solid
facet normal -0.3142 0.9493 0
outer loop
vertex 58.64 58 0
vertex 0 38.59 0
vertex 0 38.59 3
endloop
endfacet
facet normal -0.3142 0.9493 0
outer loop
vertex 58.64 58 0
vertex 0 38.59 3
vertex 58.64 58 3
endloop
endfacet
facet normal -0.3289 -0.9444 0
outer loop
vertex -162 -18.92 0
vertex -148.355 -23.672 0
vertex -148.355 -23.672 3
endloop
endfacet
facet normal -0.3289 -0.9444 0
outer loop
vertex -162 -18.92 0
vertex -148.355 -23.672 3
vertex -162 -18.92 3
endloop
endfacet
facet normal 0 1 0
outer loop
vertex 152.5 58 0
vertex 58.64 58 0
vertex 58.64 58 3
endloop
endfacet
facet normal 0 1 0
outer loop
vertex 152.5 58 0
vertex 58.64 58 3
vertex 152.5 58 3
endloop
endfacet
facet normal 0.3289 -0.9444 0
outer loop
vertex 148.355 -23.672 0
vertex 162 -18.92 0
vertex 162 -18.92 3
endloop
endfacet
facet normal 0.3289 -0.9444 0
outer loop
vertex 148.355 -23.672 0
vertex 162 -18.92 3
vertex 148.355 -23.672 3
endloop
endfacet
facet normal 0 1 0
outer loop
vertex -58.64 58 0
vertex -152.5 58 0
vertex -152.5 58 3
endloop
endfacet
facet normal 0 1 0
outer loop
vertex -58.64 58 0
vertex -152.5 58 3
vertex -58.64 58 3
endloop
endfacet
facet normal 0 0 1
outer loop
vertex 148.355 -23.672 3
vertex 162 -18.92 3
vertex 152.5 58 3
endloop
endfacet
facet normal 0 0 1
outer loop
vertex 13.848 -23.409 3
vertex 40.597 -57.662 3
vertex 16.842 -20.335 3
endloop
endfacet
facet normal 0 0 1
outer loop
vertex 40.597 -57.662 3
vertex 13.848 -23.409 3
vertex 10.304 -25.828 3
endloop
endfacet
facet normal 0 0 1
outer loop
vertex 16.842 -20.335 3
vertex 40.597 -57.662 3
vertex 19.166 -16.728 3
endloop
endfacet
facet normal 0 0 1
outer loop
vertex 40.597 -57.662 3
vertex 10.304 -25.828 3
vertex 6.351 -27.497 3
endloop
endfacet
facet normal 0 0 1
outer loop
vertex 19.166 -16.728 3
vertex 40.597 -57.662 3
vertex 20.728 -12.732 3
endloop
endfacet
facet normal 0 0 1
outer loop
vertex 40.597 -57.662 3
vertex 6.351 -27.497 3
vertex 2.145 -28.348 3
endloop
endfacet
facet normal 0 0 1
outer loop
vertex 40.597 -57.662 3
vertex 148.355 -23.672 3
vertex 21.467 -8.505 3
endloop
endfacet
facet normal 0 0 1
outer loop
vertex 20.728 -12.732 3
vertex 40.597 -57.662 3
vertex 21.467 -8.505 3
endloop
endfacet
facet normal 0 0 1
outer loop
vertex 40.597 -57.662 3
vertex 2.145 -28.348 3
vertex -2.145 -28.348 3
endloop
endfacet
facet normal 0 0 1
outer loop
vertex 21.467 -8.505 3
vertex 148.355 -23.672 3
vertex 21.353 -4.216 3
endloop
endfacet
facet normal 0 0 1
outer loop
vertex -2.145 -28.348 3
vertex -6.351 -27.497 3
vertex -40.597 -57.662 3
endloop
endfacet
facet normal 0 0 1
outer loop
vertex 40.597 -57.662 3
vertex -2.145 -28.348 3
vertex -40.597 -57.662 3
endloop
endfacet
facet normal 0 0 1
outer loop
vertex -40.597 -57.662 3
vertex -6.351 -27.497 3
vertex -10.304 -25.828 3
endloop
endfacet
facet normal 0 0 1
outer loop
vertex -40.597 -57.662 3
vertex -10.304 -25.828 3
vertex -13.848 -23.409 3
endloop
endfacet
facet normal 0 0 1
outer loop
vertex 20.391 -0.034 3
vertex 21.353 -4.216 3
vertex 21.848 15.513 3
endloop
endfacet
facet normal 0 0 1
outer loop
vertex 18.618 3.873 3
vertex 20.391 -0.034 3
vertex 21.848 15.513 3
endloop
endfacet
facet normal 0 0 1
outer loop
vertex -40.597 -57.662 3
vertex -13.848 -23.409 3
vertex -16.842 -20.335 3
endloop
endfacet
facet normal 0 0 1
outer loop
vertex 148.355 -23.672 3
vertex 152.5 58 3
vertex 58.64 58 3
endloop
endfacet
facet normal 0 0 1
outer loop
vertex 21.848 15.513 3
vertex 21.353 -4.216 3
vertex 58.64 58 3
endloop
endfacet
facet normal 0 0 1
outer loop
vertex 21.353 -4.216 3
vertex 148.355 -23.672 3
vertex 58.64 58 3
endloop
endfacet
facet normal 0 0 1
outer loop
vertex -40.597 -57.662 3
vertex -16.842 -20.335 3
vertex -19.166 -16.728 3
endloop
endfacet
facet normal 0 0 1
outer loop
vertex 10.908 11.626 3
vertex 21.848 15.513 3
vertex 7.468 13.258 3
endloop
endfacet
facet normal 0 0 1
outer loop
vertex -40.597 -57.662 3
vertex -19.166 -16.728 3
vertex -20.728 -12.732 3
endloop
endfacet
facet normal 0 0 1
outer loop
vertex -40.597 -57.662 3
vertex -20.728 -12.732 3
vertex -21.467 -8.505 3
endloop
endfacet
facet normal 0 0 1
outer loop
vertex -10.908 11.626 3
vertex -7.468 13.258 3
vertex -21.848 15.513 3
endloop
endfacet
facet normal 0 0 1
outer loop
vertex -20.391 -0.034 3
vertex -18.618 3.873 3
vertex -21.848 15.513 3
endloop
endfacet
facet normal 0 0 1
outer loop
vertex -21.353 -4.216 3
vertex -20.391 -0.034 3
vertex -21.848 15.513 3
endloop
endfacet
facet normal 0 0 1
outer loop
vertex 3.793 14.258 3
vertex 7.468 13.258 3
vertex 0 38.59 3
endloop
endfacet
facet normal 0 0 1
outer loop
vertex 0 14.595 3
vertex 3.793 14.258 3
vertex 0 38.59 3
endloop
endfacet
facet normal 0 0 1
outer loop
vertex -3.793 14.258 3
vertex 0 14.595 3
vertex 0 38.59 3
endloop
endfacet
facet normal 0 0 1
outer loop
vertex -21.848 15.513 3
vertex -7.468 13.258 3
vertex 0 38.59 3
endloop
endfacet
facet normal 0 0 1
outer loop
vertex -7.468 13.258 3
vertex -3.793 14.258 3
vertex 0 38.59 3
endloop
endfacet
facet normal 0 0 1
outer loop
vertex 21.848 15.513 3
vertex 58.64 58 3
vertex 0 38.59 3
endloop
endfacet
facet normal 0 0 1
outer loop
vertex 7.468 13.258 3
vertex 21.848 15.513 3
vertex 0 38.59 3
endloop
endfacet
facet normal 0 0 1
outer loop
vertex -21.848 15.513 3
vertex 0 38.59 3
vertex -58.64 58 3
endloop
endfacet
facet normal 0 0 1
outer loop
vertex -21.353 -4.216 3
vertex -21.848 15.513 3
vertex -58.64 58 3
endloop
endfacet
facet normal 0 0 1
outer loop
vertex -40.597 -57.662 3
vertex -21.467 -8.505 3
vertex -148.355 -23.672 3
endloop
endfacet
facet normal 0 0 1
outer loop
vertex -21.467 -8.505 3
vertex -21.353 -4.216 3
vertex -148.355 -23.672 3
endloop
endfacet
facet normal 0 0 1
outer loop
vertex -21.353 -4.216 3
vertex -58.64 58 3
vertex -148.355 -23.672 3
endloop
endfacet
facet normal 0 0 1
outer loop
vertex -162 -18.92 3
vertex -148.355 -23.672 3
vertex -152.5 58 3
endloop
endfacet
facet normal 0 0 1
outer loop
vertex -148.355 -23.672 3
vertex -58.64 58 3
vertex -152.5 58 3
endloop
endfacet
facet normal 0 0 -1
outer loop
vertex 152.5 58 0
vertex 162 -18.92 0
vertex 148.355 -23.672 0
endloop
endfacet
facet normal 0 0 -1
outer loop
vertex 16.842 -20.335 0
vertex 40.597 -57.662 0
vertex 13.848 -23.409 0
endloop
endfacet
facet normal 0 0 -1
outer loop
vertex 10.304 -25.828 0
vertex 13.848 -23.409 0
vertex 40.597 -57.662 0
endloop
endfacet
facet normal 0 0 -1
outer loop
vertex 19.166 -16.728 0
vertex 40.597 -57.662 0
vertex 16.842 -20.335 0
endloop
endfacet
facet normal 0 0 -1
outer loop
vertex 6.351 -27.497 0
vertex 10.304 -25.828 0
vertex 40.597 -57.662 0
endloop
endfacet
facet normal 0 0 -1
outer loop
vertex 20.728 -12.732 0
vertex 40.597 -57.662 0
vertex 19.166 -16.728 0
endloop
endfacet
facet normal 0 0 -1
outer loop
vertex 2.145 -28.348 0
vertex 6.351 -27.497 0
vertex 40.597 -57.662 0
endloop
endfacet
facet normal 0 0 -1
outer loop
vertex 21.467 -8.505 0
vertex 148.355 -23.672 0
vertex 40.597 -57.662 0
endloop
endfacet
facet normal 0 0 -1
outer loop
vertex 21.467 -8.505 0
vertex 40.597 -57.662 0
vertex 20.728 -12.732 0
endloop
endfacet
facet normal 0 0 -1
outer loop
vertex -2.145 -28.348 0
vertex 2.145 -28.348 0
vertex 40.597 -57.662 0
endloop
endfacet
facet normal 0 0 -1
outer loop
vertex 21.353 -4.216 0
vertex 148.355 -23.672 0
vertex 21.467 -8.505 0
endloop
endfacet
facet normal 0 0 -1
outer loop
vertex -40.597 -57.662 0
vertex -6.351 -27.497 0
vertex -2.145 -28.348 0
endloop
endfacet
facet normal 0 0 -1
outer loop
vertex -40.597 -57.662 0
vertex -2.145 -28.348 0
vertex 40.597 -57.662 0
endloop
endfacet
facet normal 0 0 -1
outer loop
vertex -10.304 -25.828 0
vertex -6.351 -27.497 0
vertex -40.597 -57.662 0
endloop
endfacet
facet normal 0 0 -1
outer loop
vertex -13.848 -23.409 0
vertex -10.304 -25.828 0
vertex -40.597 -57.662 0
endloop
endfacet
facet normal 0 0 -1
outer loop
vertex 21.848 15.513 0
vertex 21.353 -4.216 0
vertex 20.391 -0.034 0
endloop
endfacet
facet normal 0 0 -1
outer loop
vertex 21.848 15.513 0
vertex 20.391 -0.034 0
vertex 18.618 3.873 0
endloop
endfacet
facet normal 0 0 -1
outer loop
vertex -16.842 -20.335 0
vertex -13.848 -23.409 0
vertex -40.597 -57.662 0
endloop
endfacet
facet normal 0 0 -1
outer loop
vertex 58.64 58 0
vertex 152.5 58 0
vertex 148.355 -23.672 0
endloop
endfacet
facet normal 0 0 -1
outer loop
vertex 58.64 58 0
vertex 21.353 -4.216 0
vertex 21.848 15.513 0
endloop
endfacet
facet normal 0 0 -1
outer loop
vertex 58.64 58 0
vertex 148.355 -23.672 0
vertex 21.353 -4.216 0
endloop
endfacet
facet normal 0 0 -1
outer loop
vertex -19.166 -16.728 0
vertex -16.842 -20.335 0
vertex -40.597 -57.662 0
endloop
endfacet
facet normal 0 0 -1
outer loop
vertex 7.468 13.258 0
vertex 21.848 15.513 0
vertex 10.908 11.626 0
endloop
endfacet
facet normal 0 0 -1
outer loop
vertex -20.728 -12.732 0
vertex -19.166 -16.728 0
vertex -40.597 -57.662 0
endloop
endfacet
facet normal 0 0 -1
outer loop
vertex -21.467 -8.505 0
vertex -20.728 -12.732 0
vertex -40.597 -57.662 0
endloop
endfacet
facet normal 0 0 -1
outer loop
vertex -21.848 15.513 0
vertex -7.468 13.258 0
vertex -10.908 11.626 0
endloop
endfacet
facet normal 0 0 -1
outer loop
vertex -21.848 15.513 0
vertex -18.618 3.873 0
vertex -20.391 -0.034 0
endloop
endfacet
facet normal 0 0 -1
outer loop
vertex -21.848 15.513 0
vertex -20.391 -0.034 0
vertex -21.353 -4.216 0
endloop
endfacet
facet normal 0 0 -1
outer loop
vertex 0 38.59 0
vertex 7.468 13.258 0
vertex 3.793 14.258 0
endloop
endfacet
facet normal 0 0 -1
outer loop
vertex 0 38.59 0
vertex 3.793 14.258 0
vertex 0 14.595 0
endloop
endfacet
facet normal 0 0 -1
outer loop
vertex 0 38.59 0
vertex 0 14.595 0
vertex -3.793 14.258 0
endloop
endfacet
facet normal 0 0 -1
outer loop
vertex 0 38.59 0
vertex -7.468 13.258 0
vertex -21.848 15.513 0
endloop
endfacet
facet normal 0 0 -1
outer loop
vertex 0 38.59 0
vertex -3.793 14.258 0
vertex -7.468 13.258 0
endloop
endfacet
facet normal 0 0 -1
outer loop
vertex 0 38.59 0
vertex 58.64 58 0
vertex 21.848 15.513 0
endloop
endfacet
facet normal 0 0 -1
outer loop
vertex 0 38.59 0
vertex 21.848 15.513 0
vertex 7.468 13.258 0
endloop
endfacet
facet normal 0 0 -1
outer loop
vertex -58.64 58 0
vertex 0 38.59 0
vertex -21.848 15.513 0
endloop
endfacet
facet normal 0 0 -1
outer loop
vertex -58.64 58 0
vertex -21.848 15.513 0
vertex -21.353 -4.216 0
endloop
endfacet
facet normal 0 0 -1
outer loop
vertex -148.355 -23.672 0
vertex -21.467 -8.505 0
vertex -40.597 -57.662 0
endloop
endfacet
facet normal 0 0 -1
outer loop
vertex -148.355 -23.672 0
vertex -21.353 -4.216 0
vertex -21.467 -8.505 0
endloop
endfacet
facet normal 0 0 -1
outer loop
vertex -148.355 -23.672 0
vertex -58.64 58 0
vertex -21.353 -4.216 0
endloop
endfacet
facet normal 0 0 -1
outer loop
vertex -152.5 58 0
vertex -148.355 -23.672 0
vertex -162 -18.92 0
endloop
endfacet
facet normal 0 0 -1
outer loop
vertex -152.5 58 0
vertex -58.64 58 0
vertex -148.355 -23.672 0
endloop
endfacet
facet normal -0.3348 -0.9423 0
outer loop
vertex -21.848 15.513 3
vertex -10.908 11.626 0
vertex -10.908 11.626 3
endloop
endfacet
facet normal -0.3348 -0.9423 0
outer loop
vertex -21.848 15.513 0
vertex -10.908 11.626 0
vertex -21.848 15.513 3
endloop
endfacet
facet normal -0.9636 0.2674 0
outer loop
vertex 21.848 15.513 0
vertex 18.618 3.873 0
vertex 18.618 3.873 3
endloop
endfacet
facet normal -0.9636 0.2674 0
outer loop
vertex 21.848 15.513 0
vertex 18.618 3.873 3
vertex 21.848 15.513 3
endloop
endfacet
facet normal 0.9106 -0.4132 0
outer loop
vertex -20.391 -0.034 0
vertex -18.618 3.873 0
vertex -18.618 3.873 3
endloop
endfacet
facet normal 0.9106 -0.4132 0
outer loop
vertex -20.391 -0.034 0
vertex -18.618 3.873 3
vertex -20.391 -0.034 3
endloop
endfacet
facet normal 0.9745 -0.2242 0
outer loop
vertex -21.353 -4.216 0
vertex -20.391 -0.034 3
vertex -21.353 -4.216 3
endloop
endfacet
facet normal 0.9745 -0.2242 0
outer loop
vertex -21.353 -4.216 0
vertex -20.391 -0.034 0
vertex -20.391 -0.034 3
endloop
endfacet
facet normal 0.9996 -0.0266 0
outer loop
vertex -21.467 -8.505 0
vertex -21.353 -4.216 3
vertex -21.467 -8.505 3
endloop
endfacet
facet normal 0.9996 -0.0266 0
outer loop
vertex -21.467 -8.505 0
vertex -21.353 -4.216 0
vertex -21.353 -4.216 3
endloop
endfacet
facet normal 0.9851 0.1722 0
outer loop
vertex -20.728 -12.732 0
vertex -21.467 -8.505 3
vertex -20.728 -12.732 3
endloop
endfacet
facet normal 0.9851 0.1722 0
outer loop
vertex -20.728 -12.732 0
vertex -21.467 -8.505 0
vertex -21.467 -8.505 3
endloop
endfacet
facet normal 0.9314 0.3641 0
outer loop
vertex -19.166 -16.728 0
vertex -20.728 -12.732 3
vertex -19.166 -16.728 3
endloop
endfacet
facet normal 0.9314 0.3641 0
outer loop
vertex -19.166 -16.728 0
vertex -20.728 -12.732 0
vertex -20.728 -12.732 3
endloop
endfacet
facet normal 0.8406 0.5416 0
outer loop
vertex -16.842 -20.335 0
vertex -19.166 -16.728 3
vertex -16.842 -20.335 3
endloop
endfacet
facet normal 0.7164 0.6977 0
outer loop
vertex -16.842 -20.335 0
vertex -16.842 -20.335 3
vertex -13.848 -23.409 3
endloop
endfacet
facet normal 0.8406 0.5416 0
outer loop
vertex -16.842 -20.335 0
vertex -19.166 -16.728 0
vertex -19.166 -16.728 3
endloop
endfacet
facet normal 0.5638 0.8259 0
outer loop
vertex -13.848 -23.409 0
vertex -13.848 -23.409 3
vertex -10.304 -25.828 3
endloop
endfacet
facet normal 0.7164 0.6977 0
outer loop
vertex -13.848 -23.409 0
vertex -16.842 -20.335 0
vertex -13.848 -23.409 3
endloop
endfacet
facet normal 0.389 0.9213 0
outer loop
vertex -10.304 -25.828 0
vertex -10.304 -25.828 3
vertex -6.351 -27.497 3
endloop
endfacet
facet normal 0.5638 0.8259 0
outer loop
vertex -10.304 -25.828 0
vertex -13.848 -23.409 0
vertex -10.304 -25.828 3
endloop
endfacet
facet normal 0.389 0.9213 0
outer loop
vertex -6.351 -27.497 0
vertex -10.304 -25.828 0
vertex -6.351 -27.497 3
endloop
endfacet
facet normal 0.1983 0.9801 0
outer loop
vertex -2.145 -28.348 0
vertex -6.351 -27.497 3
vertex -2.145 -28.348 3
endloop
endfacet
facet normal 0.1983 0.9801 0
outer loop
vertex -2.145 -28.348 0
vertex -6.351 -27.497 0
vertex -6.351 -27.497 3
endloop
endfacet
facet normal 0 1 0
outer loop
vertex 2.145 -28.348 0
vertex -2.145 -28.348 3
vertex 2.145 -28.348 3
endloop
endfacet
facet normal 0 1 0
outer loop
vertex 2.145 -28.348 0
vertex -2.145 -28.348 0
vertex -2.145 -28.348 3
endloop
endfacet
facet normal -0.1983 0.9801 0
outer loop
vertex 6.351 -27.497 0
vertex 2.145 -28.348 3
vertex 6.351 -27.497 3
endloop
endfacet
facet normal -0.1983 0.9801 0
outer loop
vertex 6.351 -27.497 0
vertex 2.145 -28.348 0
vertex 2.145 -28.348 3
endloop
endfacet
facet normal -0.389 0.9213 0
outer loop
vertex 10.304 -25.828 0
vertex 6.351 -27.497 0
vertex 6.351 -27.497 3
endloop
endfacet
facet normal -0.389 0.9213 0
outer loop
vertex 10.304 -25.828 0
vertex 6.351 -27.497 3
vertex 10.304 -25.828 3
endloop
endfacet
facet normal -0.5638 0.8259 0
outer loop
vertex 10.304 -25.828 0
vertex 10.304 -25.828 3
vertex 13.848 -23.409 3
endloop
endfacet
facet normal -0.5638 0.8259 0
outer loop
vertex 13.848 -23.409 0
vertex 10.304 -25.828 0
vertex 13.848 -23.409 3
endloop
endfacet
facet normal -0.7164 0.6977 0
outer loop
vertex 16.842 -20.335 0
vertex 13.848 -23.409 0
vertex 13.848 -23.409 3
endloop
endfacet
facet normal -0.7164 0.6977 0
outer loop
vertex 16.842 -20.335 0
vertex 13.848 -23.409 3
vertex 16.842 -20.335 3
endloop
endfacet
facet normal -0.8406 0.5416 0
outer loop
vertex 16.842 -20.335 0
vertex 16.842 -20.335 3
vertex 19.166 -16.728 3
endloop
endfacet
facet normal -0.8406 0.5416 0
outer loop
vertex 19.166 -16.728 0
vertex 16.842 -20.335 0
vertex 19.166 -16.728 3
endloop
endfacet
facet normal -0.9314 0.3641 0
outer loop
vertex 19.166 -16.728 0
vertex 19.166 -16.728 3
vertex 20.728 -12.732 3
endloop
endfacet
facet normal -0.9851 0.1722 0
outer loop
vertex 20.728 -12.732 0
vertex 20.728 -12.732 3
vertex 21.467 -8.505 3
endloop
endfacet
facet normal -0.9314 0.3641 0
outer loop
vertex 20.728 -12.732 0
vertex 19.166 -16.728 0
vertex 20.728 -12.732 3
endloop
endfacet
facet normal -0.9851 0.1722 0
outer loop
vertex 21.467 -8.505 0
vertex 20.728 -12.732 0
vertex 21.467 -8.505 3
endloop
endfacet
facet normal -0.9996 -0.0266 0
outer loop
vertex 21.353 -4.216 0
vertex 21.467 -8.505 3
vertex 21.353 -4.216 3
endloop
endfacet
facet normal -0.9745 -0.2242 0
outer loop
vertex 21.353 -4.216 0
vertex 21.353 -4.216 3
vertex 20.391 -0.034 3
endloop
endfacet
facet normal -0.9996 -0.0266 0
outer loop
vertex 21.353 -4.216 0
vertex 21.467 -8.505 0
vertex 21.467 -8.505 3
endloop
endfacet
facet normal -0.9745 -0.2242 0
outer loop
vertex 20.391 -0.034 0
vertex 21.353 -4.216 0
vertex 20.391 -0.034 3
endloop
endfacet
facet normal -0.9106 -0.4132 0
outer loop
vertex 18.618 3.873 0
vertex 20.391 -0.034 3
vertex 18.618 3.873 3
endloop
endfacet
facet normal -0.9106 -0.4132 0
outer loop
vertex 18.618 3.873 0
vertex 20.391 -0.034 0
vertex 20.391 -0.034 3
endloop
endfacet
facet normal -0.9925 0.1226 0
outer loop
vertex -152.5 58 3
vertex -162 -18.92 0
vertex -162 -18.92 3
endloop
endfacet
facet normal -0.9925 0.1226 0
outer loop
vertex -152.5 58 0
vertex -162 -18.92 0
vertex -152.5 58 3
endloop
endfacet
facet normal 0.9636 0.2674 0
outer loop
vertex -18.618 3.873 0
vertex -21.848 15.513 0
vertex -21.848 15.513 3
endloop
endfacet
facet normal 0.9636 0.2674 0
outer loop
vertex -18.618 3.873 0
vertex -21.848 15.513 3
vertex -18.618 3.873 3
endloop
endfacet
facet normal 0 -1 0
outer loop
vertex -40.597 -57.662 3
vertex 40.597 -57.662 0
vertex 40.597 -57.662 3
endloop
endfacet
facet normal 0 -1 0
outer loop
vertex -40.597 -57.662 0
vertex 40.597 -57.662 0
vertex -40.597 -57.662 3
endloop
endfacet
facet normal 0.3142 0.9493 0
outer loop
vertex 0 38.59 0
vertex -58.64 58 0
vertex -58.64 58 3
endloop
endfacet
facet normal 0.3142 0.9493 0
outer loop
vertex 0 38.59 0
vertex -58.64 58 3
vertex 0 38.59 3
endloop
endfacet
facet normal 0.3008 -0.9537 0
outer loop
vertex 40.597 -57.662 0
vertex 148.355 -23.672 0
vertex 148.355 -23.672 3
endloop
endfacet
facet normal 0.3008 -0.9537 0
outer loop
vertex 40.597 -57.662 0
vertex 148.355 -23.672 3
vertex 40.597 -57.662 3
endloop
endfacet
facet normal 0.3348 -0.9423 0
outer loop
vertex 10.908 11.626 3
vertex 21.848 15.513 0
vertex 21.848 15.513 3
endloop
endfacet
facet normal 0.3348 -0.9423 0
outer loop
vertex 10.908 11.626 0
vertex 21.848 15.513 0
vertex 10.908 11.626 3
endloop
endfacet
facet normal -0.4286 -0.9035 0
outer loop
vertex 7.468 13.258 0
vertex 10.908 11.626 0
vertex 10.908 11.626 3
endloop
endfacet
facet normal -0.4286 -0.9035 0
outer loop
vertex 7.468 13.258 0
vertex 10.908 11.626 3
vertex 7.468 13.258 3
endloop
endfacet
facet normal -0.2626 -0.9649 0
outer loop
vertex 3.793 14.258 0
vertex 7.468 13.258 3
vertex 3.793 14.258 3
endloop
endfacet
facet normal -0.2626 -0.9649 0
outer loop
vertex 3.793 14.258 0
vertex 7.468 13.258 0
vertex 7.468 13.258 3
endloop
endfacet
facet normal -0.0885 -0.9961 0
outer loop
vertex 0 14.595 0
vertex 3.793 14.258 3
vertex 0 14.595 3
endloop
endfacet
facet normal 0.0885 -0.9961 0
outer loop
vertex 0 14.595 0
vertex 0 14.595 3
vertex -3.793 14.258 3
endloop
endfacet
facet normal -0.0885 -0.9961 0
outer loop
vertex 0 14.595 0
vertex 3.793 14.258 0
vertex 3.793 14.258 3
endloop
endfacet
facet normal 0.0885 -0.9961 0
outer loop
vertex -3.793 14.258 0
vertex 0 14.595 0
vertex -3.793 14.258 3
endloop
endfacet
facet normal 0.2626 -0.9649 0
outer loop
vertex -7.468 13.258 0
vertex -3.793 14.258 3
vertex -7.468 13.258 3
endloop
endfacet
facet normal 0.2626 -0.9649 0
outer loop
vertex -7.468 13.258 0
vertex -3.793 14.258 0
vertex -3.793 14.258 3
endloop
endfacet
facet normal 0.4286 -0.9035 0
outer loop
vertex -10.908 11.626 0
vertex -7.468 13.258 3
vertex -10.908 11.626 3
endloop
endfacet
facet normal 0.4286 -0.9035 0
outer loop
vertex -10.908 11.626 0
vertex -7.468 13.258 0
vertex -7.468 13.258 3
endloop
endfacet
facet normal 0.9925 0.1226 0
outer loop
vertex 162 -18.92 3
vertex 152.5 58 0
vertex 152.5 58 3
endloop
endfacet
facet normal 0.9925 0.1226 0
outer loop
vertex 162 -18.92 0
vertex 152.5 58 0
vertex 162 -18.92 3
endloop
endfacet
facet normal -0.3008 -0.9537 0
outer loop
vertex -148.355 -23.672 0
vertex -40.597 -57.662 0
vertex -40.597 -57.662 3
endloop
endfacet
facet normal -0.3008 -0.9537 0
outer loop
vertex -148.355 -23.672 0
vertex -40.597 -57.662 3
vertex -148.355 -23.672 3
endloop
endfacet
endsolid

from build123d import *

# Parameters (mm, degrees)
EXTRUDE_1_DEPTH = 3


with BuildPart() as part:
    # Sketch 273 → Бобышка-Вытянуть1 (new body)
    with BuildSketch(Plane.XY):
        Polygon((148.354716995, -23.671565122), (40.597138959, -57.662313559), (-40.597138959, -57.662313559), (-148.354716995, -23.671565122), (-162, -18.92), (-152.5, 58), (-58.64, 58), (0, 38.59), (58.64, 58), (152.5, 58), (162, -18.92), align=None)
        with BuildLine():
            Line((-10.908195141, 11.626317085), (-21.848195141, 15.513282482))
            Line((-21.848195141, 15.513282482), (-18.617591482, 3.873282482))
            ThreePointArc((-18.617591482, 3.873282482), (0, -28.455), (18.617591482, 3.873282482))
            Line((18.617591482, 3.873282482), (21.848195141, 15.513282482))
            Line((21.848195141, 15.513282482), (10.908195141, 11.626317085))
            ThreePointArc((10.908195141, 11.626317085), (0, 14.595), (-10.908195141, 11.626317085))
        make_face(mode=Mode.SUBTRACT)
    extrude(amount=EXTRUDE_1_DEPTH)


solid = part.part
